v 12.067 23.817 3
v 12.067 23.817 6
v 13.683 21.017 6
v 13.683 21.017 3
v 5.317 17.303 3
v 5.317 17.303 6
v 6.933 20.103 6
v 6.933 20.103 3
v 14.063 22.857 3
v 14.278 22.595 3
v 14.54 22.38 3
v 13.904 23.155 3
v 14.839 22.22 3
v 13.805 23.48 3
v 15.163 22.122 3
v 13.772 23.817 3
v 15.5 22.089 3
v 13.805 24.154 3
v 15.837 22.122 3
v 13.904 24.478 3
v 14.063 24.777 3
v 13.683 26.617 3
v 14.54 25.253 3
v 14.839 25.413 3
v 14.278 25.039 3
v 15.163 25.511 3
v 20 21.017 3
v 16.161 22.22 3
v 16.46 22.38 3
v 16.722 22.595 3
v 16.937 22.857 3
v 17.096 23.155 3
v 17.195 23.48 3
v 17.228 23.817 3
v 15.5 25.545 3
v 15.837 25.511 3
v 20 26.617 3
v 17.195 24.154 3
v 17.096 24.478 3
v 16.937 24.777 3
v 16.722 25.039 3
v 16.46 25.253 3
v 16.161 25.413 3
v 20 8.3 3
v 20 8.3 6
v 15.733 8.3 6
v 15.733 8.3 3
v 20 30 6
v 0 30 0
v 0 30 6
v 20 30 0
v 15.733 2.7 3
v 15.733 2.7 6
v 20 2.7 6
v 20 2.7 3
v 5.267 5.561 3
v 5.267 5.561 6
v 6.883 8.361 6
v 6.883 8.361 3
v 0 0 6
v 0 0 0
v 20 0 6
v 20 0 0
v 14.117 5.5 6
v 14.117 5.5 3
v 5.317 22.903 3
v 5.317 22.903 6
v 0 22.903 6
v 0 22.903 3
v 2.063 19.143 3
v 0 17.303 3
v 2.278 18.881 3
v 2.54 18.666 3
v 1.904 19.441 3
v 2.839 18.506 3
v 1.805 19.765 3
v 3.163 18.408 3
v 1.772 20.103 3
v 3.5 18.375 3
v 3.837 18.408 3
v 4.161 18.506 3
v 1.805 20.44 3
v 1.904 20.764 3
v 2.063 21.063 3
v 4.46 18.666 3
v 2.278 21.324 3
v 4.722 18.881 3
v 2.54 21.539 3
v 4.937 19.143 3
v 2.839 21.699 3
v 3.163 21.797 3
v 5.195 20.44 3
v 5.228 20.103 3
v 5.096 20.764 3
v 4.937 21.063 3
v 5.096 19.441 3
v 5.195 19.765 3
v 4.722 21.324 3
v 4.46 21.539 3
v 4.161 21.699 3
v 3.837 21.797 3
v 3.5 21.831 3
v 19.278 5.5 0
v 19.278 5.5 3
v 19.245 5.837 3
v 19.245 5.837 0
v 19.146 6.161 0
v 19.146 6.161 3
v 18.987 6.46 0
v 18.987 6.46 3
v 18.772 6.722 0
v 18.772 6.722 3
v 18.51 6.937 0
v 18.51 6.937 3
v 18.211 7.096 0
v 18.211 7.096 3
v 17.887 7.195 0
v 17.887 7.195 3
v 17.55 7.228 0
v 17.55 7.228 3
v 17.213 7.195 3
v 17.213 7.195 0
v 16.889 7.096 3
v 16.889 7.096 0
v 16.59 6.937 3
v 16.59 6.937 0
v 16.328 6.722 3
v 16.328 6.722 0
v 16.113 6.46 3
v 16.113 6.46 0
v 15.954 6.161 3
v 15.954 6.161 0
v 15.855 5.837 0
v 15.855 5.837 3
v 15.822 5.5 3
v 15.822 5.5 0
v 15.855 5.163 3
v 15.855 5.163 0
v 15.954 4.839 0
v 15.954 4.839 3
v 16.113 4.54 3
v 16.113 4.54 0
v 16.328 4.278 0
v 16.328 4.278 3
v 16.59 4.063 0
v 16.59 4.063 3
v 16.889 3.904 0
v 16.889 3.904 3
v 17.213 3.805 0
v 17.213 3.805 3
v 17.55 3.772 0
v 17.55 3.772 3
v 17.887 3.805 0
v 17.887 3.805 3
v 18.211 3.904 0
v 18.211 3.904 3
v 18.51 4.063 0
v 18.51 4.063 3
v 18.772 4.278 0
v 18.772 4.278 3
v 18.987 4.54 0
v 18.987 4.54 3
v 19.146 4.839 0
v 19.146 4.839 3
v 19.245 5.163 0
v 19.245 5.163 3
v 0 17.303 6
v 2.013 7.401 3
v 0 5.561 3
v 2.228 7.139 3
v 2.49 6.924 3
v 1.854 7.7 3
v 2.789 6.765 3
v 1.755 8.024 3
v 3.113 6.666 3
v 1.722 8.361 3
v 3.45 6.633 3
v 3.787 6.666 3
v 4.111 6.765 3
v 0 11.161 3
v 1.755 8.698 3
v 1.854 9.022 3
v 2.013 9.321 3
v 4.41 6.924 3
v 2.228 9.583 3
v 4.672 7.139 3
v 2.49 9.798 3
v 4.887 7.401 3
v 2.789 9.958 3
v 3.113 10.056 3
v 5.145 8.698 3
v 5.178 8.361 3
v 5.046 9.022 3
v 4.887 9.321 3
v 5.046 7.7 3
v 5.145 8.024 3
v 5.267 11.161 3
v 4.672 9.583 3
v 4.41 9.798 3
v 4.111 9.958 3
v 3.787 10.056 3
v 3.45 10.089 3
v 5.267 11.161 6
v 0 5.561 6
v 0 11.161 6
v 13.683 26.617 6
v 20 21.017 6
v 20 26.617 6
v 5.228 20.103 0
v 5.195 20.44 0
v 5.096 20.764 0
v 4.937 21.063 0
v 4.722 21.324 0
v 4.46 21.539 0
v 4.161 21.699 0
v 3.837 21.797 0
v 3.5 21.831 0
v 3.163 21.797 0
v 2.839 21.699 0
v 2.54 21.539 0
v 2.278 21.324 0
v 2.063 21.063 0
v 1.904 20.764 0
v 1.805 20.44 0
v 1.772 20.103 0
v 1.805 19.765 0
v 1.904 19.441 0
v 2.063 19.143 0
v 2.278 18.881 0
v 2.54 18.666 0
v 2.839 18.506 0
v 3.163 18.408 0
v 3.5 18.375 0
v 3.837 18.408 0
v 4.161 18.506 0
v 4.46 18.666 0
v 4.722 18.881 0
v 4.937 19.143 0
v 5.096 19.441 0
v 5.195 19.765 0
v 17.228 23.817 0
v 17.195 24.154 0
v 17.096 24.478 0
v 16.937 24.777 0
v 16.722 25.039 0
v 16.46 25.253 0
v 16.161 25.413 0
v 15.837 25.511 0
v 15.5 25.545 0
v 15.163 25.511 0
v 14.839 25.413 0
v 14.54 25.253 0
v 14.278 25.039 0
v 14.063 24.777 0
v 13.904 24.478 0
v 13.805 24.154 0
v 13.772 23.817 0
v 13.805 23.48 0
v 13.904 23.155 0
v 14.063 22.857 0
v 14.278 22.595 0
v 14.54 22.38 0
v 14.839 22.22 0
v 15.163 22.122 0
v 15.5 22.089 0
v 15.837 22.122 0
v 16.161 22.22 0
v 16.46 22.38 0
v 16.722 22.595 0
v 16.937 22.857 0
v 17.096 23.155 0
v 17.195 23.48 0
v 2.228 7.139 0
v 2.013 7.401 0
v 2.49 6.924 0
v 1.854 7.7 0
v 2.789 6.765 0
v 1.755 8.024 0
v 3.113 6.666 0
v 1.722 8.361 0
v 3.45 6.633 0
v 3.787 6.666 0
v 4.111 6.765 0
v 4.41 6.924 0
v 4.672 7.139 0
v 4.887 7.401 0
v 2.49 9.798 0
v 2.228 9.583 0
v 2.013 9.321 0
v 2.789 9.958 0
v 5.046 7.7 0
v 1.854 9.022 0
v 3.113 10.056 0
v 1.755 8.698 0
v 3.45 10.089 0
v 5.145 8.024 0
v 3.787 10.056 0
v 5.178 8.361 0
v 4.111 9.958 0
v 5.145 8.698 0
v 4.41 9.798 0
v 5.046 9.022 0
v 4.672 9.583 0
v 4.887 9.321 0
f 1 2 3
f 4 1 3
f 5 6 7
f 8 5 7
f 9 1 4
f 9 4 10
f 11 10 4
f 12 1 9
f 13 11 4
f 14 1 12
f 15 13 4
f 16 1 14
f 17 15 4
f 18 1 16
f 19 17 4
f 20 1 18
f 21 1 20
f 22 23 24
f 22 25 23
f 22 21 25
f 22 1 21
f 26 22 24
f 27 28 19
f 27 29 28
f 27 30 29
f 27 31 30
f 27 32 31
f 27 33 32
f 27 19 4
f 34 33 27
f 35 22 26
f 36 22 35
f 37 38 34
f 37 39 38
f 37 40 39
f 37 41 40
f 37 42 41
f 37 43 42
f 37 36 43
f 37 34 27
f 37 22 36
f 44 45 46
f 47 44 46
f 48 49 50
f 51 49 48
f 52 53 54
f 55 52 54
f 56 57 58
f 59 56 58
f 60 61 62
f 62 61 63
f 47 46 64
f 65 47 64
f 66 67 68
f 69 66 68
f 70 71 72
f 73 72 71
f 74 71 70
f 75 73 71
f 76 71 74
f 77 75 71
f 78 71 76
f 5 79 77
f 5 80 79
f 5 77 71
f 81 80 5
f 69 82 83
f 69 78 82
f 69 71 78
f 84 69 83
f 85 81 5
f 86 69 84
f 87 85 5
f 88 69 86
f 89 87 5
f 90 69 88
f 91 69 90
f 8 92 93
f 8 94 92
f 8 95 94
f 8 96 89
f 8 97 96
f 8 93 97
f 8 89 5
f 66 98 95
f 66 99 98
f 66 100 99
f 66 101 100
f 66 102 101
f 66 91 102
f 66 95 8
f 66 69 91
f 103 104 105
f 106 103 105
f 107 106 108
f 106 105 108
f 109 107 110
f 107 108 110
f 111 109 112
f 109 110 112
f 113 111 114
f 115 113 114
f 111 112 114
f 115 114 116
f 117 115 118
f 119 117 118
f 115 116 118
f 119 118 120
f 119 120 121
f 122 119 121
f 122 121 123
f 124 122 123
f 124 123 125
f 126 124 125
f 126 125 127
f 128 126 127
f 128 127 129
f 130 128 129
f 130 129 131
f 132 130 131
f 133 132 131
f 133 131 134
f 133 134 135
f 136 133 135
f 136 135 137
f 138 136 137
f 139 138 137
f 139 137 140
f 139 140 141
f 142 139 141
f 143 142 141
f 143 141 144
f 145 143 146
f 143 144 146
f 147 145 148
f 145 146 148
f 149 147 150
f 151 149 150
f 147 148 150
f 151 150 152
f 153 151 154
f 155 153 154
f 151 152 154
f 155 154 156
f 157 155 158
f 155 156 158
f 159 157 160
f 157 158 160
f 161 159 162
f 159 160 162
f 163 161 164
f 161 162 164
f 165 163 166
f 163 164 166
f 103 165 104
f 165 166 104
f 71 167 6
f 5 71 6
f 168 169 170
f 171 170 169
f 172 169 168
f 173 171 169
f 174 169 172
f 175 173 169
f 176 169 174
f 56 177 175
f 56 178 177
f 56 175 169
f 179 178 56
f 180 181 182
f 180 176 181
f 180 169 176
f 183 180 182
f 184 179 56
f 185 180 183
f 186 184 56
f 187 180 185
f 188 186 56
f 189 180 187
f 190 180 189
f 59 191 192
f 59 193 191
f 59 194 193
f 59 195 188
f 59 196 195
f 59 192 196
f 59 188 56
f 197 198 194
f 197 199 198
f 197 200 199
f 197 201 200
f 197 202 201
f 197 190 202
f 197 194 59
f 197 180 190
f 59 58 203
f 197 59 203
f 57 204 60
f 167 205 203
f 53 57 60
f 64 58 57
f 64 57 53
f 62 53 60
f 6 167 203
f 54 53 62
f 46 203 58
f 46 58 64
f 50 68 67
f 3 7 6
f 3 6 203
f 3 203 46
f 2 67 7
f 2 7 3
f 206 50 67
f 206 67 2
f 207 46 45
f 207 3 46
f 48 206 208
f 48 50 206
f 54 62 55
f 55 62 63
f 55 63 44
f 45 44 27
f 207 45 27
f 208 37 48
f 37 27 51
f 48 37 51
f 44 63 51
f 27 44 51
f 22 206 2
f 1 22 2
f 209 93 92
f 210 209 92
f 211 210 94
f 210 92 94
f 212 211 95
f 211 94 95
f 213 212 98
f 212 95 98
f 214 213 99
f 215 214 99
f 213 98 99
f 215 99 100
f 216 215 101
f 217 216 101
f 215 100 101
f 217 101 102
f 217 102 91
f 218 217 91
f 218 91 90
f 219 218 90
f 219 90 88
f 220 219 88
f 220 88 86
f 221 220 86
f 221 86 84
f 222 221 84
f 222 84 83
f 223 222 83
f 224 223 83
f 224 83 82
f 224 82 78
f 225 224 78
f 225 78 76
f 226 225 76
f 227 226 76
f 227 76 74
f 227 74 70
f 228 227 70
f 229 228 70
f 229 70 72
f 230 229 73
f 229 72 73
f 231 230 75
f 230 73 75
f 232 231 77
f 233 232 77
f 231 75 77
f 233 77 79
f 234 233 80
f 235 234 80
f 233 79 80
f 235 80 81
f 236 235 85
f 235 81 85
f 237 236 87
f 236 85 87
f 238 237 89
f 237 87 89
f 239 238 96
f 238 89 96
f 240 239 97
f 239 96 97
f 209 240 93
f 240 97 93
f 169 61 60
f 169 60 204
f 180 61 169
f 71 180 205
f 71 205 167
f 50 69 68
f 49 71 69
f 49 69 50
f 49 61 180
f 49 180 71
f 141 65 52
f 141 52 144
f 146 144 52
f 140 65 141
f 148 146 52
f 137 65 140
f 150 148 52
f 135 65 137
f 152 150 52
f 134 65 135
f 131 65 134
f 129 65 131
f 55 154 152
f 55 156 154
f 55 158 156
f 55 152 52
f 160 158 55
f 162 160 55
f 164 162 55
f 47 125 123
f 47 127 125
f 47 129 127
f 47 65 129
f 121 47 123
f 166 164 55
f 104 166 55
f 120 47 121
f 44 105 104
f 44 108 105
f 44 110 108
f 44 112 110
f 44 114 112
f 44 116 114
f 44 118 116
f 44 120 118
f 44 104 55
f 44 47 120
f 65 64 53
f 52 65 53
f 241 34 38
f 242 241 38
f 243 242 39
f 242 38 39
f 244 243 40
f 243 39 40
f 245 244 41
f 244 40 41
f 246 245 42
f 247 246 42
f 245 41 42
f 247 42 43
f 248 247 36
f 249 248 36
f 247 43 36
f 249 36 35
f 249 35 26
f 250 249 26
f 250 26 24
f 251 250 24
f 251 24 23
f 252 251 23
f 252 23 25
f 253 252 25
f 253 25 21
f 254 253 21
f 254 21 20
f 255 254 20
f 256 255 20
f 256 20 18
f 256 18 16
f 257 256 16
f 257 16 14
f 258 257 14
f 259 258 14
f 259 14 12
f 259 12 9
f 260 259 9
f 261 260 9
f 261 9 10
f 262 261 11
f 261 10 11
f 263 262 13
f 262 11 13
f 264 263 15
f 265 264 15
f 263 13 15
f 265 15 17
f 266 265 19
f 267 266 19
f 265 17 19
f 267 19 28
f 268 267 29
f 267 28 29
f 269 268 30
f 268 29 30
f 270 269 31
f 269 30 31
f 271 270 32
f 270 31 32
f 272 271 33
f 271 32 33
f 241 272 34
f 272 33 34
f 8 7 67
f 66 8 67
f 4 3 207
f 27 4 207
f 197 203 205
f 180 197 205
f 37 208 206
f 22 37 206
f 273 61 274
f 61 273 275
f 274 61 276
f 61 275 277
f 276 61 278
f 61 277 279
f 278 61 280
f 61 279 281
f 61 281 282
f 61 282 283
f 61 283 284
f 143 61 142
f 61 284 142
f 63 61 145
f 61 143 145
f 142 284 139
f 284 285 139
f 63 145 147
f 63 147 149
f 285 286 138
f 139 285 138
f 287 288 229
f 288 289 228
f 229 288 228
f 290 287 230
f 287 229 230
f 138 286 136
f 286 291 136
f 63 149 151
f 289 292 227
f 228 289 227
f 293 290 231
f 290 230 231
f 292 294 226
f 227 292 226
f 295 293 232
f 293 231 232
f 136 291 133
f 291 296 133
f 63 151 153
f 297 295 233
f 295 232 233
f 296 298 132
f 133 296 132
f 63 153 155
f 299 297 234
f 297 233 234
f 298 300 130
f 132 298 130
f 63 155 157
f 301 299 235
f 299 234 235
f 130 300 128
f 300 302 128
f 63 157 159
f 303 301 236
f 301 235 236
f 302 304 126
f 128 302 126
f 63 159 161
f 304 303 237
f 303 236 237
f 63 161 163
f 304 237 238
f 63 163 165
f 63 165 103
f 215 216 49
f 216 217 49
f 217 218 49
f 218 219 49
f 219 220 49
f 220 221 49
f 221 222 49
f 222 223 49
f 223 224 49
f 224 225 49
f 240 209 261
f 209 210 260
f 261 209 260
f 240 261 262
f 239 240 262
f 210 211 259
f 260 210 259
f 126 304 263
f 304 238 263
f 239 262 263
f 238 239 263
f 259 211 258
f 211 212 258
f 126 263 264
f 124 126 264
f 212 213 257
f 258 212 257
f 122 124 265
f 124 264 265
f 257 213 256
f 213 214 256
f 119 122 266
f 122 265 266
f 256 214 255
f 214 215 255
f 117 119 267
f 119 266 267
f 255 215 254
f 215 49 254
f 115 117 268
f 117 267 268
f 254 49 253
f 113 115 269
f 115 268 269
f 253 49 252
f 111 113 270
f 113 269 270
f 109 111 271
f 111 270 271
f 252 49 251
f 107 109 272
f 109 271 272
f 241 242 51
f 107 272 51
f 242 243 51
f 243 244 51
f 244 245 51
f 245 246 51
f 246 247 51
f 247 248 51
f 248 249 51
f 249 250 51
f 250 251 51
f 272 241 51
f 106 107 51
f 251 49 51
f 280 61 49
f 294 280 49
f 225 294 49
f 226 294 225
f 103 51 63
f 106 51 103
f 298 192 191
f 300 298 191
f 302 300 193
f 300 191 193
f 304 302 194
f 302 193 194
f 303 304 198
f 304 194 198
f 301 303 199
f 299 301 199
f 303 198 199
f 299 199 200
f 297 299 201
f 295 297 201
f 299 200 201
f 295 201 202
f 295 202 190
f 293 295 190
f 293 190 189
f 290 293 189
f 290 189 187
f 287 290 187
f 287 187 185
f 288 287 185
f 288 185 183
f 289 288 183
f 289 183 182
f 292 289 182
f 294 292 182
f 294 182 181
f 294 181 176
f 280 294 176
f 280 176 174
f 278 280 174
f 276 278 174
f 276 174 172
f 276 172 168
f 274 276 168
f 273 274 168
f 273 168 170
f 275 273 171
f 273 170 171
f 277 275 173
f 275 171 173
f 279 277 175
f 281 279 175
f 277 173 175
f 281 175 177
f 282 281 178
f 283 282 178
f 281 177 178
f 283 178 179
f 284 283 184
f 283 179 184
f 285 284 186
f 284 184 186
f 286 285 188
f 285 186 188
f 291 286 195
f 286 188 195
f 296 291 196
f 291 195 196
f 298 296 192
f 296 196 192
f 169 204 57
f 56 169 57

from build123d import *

# Parameters (mm, degrees)
SKETCH1_W           = 20
SKETCH1_H           = 30
BOSS_EXTRUDE1_DEPTH = 6
SKETCH2_R           = 1.72792937
CUT_EXTRUDE1_DEPTH  = 7
CUT_EXTRUDE2_DEPTH  = 3


with BuildPart() as part:
    # Sketch1 → Boss-Extrude1 (new body)
    with BuildSketch(Plane.XY):
        with Locations((10, 15)):
            Rectangle(SKETCH1_W, SKETCH1_H)
    extrude(amount=BOSS_EXTRUDE1_DEPTH)

    # Sketch2 → Cut-Extrude1 (cut, through all)
    with BuildSketch(Plane.XY.offset(6)):
        with Locations((15.5, 23.816694008)):
            Circle(SKETCH2_R)
        with Locations((3.5, 20.102573312)):
            Circle(SKETCH2_R)
        with Locations((17.55, 5.5)):
            Circle(SKETCH2_R)
        with Locations((3.45, 8.361159496)):
            Circle(SKETCH2_R)
    extrude(amount=-CUT_EXTRUDE1_DEPTH, mode=Mode.SUBTRACT)

    # Sketch3 → Cut-Extrude2 (cut)
    with BuildSketch(Plane.XY.offset(6)):
        Polygon((20, 26.616694008), (13.683419246, 26.616694008), (12.066838493, 23.816694008), (13.683419246, 21.016694008), (20, 21.016694008), align=None)
        Polygon((6.933161507, 20.102573312), (5.316580754, 22.902573312), (0, 22.902573312), (0, 17.302573312), (5.316580754, 17.302573312), align=None)
        Polygon((6.883161507, 8.361159496), (5.266580754, 11.161159496), (0, 11.161159496), (0, 5.561159496), (5.266580754, 5.561159496), align=None)
        Polygon((14.116838493, 5.5), (15.733419246, 2.7), (20, 2.7), (20, 8.3), (15.733419246, 8.3), align=None)
    extrude(amount=-CUT_EXTRUDE2_DEPTH, mode=Mode.SUBTRACT)


solid = part.part
